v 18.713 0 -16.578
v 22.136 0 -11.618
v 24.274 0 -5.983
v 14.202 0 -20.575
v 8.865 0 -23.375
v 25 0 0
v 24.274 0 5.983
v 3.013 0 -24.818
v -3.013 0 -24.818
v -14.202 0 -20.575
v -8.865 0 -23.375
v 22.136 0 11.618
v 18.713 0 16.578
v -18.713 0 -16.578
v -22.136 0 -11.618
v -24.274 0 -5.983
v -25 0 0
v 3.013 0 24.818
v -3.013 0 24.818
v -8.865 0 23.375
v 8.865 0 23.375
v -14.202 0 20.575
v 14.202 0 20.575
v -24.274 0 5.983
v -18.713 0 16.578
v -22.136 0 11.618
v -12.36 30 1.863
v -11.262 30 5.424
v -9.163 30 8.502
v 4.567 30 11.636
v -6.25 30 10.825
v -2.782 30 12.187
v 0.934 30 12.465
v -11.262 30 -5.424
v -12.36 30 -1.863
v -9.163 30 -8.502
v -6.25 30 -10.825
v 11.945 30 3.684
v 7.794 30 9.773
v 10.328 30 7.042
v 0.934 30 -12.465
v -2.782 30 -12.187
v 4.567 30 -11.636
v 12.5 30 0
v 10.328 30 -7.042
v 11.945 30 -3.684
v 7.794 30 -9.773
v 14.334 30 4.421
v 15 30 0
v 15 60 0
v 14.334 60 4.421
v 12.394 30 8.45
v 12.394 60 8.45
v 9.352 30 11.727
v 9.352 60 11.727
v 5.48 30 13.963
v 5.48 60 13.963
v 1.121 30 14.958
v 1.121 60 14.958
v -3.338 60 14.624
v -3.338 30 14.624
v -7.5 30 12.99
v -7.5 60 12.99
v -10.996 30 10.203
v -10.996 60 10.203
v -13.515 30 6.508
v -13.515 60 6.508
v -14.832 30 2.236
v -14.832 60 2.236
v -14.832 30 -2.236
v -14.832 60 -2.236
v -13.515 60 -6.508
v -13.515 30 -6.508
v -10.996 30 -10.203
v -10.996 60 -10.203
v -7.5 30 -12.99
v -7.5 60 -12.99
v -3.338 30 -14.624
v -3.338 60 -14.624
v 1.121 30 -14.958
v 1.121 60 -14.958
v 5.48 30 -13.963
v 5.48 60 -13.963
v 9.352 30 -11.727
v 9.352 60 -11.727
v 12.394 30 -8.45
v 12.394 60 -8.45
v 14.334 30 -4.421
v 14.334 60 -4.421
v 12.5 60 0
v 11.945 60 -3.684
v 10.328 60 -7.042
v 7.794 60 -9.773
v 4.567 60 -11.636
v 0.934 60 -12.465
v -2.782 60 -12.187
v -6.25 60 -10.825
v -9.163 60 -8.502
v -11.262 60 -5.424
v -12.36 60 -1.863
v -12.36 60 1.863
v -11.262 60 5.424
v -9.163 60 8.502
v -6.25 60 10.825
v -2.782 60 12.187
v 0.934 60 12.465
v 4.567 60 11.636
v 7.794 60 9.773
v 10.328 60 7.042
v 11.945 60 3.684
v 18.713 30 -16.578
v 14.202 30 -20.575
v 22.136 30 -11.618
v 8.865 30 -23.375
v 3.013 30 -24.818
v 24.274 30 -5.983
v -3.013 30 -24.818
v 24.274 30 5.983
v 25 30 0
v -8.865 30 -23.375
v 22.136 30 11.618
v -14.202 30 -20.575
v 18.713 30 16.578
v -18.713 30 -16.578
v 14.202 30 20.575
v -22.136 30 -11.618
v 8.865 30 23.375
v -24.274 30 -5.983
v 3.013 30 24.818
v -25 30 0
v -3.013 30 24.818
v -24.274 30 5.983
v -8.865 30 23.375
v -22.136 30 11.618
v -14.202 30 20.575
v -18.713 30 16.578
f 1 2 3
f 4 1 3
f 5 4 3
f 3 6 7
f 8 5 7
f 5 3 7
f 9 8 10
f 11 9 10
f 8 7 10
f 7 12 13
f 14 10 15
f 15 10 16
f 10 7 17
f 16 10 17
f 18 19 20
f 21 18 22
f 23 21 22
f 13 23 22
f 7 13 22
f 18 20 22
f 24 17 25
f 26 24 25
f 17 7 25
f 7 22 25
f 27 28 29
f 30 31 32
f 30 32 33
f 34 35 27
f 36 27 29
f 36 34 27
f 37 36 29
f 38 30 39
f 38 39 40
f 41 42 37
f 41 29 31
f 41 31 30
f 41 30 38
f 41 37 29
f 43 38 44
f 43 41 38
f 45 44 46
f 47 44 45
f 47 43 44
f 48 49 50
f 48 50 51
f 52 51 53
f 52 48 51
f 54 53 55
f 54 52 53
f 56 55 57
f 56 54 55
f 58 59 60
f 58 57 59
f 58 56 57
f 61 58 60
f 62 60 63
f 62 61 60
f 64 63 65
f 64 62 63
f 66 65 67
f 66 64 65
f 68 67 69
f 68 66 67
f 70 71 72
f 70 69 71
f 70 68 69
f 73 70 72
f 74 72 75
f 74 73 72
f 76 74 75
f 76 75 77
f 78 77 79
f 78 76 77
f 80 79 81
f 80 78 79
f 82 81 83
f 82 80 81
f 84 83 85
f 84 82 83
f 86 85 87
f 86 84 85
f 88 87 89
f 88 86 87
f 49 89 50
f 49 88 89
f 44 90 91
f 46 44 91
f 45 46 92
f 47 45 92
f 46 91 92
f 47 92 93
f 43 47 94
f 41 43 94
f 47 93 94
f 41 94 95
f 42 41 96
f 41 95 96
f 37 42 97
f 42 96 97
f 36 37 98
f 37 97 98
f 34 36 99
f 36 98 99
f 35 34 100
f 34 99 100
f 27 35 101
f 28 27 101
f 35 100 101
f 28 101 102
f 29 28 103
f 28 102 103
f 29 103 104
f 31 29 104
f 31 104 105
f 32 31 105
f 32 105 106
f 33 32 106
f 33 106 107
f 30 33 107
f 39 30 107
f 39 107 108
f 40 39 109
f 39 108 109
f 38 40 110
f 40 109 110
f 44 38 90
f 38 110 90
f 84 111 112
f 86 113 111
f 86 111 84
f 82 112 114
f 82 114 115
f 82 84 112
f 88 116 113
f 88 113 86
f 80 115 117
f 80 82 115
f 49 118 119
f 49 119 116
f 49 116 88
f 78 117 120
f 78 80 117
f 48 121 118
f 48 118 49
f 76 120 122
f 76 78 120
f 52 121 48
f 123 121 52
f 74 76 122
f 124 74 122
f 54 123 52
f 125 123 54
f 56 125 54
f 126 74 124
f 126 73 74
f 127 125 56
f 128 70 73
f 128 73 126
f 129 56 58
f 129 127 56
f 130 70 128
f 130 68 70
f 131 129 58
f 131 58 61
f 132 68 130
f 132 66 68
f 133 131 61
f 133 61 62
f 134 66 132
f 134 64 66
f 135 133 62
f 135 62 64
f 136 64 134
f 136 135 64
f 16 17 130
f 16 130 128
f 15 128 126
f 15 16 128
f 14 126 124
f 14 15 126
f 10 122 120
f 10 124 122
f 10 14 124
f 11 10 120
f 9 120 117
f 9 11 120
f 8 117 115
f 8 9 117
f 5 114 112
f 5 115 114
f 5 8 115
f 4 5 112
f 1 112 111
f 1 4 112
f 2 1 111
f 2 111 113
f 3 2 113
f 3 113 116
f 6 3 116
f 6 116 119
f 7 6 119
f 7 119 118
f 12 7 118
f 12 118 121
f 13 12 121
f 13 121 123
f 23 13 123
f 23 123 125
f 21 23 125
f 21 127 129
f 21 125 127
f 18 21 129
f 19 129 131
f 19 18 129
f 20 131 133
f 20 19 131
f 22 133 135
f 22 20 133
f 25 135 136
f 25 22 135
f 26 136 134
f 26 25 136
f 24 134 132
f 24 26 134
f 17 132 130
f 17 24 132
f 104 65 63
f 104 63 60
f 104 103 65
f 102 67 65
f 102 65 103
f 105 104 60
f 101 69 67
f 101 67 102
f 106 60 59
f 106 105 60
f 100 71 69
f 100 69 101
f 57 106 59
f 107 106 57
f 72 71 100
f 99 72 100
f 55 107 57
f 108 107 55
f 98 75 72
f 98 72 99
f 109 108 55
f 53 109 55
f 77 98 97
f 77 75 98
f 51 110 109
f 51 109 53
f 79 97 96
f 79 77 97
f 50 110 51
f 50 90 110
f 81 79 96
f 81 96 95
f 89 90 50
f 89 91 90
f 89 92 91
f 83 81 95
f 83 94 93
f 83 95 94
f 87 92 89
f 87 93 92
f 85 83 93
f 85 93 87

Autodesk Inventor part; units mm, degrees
ref_plane "YZ Plane" through (0, 0, 0) normal (1, 0, 0) x (0, 1, 0)
ref_plane "XZ Plane" through (0, 0, 0) normal (0, 1, 0) x (-1, 0, 0)
ref_plane "XY Plane" through (0, 0, 0) normal (0, 0, 1) x (1, 0, 0)
sketch "Sketch30" plane through (0, 0, 0) normal (0, 1, 0) x (-1, 0, 0)
  circle A0 centre (0, 0) radius 25
  dimension "d117" = 50
extrude "Extrusion21" add sketch "Sketch30" along normal blind 30
sketch "Sketch31" plane through (0, 30, 0) normal (0, 1, 0) x (1, 0, 0)
  circle A0 centre (0, 0) radius 15
  dimension "d120" = 30
extrude "Extrusion22" add sketch "Sketch31" along normal blind 30
sketch "Sketch32" plane through (0, 60, 0) normal (0, 1, 0) x (1, 0, 0)
  circle A0 centre (0, 0) radius 15
  circle A1 centre (0, 0) radius 12.5
  dimension "d123" = 25
extrude "Extrusion23" cut sketch "Sketch32" against normal blind 30 contours A1
sketch "Sketch33" plane through (0, 0, 0) normal (0, -1, 0) x (1, 0, 0)
  point P0 (0, 0)
properties part number "Front_base"
